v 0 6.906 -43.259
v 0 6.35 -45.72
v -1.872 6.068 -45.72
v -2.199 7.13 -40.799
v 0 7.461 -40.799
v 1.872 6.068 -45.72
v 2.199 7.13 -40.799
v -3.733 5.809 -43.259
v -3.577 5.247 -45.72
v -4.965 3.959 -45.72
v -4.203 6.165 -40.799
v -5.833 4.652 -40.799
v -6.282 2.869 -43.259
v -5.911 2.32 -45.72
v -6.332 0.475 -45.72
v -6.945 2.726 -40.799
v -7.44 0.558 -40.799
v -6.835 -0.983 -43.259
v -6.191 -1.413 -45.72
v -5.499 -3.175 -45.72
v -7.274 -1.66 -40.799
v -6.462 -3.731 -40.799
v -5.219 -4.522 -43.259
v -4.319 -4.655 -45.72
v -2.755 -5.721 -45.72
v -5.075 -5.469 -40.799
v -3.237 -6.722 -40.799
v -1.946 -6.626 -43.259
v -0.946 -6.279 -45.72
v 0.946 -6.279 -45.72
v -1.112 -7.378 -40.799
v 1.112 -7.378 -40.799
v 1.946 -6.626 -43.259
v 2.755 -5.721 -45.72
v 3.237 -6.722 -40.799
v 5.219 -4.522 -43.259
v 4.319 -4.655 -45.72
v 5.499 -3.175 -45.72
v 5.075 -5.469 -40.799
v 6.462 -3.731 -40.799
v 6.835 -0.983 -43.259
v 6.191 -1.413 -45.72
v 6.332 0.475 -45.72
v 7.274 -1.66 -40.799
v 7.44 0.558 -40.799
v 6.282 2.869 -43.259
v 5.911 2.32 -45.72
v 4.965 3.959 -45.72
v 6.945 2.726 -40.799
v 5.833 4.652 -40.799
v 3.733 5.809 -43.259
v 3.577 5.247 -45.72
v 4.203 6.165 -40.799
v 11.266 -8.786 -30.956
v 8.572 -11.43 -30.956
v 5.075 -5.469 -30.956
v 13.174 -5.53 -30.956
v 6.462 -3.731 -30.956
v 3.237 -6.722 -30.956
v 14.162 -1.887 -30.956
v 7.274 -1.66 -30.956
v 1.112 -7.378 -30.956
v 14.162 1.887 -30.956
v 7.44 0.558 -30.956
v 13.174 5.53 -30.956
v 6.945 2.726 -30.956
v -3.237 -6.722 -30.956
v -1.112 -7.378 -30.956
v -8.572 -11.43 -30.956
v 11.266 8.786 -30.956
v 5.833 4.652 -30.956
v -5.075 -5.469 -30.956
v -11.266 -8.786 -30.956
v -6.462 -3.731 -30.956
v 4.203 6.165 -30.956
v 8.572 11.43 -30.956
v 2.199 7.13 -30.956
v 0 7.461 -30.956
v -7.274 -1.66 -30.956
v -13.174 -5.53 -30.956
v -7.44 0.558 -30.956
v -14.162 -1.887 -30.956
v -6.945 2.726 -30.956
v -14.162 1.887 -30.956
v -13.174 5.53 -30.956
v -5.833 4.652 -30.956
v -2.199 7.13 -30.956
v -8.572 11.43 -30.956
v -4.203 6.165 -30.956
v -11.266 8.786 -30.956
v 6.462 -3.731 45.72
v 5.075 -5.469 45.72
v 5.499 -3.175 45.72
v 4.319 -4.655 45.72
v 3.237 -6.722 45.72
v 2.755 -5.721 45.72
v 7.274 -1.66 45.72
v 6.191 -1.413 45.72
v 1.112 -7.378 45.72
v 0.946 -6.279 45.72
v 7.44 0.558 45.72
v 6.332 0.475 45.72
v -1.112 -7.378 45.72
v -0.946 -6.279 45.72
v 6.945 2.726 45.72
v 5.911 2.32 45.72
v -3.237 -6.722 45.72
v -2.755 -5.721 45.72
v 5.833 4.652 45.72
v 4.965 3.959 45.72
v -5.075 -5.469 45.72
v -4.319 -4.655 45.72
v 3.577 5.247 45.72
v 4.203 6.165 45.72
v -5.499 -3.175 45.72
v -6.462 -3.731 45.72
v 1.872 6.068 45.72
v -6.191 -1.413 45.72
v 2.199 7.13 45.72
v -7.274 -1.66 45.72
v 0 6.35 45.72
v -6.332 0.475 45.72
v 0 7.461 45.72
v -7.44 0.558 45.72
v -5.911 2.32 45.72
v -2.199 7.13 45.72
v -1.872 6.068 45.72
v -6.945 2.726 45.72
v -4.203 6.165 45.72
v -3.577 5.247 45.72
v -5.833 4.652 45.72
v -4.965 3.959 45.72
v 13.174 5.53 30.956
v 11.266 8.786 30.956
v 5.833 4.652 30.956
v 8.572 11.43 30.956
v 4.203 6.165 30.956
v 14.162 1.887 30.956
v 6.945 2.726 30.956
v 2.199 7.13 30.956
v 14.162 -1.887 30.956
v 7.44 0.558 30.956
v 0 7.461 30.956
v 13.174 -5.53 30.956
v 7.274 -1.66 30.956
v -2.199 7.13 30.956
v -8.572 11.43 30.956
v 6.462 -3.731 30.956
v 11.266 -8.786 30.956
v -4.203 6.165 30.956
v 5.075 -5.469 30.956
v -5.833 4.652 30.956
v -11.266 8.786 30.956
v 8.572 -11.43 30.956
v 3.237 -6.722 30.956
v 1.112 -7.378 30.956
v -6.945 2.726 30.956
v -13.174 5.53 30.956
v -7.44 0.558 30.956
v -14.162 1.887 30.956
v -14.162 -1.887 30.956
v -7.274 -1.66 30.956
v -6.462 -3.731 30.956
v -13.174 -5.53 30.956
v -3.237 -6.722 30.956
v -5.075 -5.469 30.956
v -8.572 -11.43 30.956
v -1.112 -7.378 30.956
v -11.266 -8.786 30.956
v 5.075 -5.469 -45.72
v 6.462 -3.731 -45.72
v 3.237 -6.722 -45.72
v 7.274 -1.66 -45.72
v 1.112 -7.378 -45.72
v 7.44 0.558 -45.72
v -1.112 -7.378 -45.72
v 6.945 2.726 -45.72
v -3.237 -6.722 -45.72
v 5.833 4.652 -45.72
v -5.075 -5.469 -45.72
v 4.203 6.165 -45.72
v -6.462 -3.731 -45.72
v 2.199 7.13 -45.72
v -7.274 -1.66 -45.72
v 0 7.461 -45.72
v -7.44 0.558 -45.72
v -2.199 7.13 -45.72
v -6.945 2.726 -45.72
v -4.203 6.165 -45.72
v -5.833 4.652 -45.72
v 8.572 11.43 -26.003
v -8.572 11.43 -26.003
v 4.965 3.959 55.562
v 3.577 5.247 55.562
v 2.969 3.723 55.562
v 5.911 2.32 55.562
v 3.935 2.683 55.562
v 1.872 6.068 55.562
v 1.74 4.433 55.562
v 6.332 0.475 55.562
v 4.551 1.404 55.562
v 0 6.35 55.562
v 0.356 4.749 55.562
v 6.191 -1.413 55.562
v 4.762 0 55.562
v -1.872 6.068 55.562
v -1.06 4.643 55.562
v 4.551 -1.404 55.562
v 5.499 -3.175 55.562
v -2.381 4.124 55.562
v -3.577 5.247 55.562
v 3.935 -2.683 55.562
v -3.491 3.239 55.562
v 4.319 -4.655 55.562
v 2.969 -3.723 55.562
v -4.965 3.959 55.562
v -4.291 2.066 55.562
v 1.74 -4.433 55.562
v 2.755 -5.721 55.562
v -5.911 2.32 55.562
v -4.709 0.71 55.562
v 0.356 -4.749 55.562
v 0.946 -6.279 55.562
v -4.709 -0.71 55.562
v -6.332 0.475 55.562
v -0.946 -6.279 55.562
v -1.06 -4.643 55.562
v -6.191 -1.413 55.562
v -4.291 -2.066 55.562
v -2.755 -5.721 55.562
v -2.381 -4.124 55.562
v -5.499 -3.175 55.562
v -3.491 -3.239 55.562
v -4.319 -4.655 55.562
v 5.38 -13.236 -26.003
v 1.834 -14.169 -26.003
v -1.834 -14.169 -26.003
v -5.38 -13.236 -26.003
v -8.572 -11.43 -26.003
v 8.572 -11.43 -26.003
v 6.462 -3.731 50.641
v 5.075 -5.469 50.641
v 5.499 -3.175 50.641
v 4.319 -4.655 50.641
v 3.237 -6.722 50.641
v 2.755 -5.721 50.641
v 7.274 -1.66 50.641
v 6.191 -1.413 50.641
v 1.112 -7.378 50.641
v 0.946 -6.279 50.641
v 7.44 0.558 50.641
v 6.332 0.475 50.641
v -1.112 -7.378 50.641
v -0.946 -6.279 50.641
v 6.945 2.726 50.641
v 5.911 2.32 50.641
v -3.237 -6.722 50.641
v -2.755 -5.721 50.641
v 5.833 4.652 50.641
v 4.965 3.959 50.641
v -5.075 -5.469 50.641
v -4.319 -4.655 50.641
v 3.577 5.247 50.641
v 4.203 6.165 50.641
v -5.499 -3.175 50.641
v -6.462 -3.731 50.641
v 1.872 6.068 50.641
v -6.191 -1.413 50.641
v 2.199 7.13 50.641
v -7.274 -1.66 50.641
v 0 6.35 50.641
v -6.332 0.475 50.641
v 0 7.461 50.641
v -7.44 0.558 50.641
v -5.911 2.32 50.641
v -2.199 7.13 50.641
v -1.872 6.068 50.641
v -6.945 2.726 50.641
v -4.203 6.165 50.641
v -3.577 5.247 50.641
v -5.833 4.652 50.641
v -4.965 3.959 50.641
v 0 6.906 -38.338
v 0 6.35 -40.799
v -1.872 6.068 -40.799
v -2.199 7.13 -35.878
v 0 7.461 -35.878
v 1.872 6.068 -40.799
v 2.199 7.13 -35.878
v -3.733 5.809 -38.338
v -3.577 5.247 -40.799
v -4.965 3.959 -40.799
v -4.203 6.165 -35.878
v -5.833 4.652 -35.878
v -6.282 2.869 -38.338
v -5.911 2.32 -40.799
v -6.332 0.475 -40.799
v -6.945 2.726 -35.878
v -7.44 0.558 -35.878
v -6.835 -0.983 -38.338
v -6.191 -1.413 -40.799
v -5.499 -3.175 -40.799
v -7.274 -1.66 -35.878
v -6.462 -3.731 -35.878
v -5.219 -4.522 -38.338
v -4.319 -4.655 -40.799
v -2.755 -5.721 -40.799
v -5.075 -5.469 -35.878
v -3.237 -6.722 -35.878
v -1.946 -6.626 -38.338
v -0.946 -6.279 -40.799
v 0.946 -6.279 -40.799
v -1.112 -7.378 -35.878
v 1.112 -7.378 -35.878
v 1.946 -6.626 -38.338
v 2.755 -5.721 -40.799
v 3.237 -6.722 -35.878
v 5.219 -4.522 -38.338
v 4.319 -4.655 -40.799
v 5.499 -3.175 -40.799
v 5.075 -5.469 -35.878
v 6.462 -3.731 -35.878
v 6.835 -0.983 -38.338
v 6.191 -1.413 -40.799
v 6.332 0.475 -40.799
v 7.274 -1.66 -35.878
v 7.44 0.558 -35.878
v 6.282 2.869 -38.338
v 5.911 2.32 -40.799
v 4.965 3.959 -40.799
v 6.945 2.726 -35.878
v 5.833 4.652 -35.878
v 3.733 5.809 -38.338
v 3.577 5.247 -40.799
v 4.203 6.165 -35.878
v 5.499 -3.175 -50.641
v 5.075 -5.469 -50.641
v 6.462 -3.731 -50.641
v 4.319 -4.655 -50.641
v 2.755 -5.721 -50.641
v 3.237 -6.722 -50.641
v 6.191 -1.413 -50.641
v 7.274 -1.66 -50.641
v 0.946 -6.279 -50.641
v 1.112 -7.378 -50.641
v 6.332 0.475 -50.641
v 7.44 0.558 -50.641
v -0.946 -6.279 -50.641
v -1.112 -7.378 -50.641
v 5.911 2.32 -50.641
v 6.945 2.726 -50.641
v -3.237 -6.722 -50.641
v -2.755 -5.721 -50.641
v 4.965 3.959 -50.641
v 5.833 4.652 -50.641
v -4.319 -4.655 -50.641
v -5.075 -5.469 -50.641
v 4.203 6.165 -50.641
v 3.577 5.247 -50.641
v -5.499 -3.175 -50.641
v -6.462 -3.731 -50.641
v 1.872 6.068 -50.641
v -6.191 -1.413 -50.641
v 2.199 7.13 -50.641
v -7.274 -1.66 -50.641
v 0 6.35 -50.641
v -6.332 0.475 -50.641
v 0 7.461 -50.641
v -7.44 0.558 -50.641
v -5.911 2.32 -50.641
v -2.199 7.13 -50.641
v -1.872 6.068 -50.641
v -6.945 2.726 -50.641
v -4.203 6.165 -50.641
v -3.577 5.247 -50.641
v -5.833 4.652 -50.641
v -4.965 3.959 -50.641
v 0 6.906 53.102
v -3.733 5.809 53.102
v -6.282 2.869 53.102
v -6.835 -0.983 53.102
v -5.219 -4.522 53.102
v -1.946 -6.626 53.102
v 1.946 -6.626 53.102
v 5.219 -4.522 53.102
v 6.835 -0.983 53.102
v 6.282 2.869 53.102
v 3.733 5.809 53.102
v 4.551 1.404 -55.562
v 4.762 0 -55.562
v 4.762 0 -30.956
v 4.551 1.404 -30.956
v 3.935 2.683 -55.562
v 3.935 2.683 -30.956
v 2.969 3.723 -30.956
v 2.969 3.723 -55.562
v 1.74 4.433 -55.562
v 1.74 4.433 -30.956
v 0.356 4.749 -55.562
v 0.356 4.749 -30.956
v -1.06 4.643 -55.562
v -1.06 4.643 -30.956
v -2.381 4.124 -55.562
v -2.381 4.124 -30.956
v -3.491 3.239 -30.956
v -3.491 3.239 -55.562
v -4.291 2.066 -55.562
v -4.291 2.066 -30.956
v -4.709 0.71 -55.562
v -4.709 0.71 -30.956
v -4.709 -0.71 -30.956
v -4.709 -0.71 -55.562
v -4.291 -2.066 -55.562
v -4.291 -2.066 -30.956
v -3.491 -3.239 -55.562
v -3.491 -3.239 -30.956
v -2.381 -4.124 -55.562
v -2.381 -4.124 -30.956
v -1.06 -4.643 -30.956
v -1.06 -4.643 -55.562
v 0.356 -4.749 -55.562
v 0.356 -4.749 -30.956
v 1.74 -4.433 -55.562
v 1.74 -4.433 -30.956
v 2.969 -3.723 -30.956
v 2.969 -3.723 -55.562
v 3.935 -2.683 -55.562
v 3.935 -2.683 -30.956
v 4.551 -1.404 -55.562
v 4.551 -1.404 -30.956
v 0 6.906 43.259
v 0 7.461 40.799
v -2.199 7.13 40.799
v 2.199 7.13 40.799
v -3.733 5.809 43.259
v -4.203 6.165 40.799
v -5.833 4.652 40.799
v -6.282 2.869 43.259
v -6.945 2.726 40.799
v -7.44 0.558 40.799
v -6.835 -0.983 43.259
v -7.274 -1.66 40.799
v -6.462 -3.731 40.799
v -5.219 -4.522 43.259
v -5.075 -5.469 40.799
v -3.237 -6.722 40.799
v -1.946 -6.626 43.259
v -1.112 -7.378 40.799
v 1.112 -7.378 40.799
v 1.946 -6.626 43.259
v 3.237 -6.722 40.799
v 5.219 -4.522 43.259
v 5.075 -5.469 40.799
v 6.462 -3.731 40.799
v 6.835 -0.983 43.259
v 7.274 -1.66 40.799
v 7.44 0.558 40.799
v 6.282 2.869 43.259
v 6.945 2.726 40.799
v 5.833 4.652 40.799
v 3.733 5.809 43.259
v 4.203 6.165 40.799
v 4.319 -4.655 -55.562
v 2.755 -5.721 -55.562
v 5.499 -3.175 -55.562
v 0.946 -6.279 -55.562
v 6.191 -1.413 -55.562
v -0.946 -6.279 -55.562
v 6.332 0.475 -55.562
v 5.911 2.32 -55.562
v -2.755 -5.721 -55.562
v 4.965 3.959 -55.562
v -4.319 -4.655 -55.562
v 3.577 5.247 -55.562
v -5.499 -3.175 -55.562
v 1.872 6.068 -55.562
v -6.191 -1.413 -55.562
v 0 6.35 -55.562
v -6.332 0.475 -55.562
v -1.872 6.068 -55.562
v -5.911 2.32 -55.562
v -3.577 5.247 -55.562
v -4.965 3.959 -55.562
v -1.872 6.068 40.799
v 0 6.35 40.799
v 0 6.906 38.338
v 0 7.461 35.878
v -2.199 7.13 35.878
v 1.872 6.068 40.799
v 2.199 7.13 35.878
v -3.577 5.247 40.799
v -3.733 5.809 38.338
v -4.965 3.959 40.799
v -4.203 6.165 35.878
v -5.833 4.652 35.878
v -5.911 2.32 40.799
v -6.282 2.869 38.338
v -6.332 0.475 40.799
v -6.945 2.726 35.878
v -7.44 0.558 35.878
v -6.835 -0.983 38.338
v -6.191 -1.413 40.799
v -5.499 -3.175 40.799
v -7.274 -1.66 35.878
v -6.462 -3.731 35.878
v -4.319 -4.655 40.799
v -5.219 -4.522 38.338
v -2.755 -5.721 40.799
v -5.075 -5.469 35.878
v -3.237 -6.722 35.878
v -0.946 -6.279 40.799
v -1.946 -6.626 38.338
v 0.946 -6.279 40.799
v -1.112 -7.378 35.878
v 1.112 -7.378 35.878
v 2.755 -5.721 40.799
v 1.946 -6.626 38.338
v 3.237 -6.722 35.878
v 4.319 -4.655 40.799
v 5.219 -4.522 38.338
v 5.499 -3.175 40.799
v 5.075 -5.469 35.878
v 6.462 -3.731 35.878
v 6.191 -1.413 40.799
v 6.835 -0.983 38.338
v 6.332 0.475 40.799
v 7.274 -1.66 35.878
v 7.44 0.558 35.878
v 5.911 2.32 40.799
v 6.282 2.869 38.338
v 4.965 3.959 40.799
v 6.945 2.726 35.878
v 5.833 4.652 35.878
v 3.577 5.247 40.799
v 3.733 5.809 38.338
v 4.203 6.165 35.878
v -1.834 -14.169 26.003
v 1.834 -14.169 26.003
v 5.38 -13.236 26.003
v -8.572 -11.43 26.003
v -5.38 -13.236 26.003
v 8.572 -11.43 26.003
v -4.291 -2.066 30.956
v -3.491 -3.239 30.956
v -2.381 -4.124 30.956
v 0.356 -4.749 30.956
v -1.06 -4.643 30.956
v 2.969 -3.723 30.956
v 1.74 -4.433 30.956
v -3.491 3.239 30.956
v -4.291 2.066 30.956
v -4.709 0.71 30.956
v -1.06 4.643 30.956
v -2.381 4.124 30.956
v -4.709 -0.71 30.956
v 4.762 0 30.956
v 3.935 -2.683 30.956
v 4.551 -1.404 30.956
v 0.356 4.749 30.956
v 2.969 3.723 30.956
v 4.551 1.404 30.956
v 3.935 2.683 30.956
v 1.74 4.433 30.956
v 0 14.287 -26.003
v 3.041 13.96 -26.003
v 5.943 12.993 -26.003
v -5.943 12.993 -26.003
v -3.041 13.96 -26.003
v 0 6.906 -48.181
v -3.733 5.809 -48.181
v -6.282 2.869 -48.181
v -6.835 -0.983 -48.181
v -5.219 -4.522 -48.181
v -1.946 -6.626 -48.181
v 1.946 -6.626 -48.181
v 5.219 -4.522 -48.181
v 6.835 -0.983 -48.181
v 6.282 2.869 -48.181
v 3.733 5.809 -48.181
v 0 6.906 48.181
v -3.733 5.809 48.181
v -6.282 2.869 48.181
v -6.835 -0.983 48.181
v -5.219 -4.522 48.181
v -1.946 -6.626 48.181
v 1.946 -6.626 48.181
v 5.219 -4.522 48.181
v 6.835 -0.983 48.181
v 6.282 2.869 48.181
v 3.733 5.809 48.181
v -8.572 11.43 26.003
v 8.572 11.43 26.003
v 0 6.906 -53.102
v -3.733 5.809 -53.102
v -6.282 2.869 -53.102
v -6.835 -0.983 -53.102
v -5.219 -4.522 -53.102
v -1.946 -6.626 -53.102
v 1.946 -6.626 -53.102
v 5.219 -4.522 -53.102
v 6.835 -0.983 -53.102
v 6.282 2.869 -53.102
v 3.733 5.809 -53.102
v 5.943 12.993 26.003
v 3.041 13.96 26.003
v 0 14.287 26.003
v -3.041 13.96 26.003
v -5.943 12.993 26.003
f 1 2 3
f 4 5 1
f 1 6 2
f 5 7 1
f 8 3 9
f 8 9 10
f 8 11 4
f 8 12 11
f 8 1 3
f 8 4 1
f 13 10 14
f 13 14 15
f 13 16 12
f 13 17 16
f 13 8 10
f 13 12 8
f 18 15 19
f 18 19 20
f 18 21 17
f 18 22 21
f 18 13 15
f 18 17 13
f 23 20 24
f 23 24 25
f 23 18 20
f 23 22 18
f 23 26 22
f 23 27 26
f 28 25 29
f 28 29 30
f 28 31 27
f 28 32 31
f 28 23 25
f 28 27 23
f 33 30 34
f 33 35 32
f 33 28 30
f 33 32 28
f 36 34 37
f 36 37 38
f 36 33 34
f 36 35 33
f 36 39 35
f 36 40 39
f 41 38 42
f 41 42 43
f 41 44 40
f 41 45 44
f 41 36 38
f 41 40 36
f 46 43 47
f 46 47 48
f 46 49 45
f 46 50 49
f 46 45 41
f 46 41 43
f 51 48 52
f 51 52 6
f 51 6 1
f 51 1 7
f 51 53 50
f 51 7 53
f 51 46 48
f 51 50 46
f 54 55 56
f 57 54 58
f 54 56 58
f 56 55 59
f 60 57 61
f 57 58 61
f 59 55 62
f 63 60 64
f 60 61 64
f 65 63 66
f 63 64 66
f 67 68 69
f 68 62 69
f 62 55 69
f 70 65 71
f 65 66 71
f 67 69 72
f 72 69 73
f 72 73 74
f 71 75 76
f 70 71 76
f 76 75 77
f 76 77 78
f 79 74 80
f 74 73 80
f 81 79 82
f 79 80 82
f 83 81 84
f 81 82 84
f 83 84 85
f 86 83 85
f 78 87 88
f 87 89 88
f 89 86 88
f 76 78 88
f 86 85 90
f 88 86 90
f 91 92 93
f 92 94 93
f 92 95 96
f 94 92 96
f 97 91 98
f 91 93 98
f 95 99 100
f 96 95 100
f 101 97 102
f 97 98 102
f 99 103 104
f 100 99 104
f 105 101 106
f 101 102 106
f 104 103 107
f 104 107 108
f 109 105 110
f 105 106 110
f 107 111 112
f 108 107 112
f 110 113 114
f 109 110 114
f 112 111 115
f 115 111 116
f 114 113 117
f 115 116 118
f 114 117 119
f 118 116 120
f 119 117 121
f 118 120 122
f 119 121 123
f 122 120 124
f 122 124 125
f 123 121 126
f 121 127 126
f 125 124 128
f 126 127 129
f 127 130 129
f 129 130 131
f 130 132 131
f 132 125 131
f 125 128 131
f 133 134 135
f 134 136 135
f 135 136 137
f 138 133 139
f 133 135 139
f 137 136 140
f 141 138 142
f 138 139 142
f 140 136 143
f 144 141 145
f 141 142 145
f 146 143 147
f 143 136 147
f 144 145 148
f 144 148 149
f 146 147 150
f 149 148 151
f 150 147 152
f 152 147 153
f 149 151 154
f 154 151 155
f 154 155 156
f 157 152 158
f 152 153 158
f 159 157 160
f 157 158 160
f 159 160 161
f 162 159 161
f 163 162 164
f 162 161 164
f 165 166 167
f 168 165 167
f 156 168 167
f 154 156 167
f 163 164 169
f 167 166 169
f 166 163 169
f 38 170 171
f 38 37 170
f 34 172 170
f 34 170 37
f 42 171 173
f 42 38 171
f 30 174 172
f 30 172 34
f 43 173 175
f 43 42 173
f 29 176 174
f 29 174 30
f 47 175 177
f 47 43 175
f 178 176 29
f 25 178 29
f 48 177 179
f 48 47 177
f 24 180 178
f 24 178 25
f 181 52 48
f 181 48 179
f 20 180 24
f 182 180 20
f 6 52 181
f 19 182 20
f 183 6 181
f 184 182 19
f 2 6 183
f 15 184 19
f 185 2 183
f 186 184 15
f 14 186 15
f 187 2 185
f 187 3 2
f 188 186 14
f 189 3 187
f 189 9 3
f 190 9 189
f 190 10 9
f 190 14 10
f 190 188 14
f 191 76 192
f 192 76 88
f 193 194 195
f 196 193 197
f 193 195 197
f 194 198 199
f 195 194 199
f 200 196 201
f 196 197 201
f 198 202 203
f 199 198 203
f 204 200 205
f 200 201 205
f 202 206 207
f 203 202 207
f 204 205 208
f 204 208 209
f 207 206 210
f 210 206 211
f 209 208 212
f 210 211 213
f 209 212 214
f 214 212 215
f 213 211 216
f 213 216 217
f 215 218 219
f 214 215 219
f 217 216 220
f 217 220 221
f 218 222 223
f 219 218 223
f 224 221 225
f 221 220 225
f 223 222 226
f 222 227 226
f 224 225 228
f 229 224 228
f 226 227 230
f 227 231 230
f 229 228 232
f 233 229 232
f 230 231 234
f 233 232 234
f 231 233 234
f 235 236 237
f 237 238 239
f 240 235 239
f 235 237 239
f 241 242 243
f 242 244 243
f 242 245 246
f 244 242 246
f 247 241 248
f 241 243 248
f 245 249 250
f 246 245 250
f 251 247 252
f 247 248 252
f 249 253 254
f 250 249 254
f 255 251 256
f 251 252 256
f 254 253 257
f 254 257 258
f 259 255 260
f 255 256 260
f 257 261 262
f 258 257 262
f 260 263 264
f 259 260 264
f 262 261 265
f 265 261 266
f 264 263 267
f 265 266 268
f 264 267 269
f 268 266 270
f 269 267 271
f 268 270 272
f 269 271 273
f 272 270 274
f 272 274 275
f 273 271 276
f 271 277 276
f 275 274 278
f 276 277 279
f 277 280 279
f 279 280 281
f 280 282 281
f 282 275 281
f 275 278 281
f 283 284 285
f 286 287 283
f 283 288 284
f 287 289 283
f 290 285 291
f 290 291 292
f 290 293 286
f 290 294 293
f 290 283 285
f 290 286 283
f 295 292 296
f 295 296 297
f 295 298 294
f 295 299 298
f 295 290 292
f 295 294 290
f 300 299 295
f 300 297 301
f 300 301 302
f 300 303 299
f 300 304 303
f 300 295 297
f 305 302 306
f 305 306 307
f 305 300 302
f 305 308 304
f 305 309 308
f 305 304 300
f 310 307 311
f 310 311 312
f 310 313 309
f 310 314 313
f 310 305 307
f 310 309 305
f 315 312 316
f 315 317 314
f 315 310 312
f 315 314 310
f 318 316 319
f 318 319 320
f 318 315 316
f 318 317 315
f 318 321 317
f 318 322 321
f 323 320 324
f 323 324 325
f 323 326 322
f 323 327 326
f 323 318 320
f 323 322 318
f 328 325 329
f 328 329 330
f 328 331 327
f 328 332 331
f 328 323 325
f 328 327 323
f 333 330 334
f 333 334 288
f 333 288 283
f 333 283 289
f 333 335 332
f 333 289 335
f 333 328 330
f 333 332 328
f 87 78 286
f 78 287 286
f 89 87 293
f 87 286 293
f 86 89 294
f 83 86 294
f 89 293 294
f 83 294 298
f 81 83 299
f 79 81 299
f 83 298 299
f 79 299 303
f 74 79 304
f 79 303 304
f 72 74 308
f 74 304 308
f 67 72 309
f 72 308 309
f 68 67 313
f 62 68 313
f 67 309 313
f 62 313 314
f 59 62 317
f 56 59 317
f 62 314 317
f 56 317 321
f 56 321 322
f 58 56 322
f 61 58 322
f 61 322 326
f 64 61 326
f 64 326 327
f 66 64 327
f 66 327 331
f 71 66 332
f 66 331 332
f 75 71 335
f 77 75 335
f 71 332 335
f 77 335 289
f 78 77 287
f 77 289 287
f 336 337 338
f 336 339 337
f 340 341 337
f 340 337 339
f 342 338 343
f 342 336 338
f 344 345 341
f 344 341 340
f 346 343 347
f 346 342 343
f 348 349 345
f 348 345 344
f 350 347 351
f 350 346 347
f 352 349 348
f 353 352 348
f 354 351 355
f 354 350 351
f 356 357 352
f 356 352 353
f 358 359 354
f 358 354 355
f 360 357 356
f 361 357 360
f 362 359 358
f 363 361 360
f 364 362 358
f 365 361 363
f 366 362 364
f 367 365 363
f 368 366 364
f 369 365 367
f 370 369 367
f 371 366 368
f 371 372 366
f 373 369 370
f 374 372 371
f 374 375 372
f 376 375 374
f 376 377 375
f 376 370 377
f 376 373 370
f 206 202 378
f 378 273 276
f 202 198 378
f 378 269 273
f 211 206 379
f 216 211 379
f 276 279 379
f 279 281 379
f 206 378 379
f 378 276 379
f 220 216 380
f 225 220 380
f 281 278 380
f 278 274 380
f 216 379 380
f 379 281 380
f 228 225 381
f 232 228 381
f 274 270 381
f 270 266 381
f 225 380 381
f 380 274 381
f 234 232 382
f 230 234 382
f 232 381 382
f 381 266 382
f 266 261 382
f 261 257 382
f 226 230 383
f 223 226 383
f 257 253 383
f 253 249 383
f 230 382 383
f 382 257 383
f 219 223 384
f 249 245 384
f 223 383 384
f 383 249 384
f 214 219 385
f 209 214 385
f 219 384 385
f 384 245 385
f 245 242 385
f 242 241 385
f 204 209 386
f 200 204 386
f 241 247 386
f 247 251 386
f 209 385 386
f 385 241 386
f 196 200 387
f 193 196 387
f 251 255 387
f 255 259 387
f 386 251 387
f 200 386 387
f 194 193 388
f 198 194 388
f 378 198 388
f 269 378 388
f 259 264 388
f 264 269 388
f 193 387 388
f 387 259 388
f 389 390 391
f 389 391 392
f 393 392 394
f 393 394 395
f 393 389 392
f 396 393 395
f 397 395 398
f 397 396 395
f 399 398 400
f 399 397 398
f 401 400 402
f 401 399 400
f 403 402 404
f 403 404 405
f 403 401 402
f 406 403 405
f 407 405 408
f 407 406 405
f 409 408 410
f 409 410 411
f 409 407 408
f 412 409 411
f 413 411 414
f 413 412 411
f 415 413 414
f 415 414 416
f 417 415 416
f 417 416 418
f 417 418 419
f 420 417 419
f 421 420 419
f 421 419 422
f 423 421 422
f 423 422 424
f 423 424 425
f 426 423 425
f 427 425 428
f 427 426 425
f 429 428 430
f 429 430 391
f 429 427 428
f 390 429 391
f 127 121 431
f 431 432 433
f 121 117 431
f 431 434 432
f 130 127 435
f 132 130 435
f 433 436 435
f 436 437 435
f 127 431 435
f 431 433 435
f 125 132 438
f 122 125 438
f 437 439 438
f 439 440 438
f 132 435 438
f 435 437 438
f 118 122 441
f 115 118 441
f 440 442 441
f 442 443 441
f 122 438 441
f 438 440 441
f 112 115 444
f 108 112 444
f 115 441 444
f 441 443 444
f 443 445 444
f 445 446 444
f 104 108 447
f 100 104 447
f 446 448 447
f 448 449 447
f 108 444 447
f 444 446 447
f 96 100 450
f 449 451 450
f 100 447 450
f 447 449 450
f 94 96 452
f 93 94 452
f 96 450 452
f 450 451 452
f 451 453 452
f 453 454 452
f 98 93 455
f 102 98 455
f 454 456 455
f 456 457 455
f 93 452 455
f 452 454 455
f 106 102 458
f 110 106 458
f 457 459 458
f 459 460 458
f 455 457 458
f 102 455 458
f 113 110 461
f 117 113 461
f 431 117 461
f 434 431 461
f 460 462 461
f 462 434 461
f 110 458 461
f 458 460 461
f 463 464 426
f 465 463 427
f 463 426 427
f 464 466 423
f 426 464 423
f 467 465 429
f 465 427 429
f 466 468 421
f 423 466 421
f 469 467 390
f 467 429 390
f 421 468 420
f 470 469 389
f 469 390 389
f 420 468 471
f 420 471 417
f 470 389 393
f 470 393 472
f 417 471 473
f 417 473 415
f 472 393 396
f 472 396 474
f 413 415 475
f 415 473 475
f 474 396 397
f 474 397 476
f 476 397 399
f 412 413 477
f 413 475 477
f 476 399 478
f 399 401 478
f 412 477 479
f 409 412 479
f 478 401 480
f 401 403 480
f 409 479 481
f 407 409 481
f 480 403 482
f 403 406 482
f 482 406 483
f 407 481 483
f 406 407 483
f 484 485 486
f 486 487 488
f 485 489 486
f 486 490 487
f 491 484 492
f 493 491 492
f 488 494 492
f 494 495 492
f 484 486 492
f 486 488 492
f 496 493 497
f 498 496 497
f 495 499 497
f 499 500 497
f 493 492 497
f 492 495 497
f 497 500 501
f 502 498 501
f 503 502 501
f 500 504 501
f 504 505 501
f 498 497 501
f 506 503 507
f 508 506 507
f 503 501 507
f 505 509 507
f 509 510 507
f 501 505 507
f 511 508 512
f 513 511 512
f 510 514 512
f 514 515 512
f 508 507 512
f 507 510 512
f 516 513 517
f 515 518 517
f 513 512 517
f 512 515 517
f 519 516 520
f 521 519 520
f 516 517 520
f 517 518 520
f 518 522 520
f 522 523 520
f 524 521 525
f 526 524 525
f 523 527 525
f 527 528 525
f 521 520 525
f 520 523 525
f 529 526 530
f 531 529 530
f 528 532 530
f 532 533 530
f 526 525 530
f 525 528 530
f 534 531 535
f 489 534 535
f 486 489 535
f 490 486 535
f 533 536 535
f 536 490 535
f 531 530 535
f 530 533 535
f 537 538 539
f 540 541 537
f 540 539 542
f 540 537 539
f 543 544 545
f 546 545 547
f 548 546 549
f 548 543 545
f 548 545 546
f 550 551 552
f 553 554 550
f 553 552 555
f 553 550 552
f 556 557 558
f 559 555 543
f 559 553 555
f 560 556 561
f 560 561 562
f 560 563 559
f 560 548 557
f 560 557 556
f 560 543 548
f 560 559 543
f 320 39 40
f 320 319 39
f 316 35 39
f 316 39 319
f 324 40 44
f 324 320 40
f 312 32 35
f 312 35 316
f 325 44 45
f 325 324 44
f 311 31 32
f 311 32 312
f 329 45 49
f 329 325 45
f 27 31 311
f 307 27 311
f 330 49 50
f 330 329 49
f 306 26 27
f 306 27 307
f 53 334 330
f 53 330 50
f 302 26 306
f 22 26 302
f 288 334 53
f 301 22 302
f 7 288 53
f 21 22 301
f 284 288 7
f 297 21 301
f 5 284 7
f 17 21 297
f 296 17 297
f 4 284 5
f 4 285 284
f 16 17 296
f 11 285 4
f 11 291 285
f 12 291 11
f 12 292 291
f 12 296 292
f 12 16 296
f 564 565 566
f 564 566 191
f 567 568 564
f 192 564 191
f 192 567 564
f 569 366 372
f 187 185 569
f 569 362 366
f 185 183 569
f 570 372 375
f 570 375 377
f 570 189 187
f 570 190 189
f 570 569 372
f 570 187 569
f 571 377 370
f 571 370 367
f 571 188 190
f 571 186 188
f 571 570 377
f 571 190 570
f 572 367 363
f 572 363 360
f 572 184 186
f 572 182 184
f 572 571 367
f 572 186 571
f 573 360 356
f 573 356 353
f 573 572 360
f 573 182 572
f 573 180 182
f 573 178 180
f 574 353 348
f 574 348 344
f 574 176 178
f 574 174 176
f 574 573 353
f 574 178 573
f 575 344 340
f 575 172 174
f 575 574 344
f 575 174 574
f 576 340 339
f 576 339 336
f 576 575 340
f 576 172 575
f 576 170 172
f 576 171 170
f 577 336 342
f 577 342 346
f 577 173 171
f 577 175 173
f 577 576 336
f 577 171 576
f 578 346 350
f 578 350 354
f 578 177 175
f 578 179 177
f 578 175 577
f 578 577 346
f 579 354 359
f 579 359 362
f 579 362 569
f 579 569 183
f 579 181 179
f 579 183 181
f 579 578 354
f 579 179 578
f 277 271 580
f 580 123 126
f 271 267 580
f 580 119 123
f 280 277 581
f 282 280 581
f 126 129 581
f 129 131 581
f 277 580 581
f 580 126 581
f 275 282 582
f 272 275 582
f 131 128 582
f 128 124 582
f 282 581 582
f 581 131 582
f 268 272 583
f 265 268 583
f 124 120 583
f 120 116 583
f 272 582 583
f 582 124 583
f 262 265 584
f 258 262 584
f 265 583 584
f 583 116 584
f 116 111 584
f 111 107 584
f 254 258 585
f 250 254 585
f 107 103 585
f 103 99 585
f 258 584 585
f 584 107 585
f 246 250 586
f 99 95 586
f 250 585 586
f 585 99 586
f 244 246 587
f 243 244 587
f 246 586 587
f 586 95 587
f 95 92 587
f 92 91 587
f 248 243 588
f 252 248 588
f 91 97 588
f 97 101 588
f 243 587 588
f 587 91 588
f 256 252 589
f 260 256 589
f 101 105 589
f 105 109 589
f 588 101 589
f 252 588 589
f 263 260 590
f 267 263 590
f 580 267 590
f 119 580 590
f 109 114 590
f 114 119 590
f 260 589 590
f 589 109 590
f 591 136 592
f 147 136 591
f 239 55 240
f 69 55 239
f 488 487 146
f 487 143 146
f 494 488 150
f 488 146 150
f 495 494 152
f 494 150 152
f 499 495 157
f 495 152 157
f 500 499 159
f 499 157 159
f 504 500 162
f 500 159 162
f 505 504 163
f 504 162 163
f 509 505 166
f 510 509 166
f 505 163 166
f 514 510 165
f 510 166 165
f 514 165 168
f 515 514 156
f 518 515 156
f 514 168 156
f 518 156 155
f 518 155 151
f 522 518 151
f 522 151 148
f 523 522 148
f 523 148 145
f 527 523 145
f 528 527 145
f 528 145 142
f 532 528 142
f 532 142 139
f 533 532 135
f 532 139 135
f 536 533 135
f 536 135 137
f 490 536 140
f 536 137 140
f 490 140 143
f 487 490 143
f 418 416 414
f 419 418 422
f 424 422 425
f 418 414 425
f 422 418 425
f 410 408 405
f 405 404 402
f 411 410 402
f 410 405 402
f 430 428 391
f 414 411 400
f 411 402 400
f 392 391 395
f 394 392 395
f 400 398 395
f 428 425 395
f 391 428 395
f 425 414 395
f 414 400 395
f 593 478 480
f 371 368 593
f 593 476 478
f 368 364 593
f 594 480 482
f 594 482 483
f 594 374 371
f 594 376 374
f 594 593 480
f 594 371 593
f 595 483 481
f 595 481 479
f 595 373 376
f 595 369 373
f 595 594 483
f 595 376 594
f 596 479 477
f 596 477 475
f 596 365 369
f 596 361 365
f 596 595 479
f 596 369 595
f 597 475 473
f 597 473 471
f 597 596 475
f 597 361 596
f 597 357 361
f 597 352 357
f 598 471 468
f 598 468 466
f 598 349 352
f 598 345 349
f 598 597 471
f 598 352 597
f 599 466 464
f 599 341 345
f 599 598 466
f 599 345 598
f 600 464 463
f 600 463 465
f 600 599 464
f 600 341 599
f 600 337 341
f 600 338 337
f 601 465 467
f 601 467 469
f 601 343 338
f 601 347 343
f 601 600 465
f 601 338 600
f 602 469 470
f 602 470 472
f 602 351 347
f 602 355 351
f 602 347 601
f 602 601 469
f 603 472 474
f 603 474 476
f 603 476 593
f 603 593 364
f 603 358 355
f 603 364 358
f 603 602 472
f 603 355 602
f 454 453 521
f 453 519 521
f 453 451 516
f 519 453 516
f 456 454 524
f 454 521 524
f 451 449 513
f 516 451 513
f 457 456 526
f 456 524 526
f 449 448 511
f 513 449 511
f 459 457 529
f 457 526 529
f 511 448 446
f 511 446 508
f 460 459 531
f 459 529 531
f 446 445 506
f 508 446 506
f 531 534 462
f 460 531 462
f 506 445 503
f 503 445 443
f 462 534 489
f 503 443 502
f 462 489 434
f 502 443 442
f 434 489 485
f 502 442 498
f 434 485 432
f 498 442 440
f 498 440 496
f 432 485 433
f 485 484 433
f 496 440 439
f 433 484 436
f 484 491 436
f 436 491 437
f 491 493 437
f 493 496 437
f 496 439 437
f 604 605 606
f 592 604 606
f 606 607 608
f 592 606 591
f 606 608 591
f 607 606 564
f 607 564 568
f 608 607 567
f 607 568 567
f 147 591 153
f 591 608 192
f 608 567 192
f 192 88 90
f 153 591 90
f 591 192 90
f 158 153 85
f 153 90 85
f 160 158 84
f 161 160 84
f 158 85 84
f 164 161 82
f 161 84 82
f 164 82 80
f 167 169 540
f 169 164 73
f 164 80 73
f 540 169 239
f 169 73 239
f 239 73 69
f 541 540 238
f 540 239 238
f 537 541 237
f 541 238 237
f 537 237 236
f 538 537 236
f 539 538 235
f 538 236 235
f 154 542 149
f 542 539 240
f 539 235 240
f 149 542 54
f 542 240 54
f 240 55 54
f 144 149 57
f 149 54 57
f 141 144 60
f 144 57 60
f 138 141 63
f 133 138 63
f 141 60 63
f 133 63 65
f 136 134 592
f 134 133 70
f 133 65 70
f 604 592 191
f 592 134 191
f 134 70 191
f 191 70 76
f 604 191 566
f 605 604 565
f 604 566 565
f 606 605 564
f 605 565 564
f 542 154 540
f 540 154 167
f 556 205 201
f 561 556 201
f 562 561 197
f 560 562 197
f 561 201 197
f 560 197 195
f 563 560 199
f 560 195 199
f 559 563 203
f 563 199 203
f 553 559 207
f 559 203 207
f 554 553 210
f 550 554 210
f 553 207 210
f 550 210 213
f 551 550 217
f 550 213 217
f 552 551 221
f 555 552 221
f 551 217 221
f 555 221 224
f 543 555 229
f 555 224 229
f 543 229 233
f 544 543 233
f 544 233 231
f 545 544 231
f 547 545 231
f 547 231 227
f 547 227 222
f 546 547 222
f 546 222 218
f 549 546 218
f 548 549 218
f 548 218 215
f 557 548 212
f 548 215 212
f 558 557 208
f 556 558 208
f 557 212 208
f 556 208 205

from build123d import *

# Parameters (mm, degrees)
CUT_EXTRUDE1_DEPTH   = 4.953
MIRROR2_COPY_1_DEPTH = 4.953
LPATTERN1_COUNT      = 4
LPATTERN1_PITCH      = 4.92125
SKETCH5_R            = 4.7625
CUT_EXTRUDE2_DEPTH   = 24.60625


with BuildPart() as part:
    # Sketch2 → Revolve1 (revolve)
    with BuildSketch(Plane(origin=(0, 0, 0), x_dir=(0, 0, -1), z_dir=(1, 0, 0))):
        Polygon((-55.5625, 0), (-55.5625, 7.46125), (-30.95625, 7.46125), (-30.95625, 14.2875), (30.95625, 14.2875), (30.95625, 7.46125), (55.5625, 7.46125), (55.5625, 0), align=None)
    revolve(axis=Axis((0, 0, -30.95625), (0, 0, 1)))

    # Sketch3 → Cut-Extrude1 (cut)
    with BuildSketch(Plane(origin=(0, 0, -30.95625), x_dir=(-1, 0, 0), z_dir=(0, 0, -1))):
        with BuildLine():
            Line((-8.5725, 11.43), (8.5725, 11.43))
            ThreePointArc((8.5725, 11.43), (0, 14.2875), (-8.5725, 11.43))
        make_face()
    cut_extrude1 = extrude(amount=-CUT_EXTRUDE1_DEPTH, mode=Mode.SUBTRACT)

    # Mirror1: Cut-Extrude1 across plane
    add(cut_extrude1.mirror(Plane.ZX), mode=Mode.SUBTRACT)

    # Mirror2: Cut-Extrude1 across plane
    add(cut_extrude1.mirror(Plane.XY), mode=Mode.SUBTRACT)

    # Mirror2 copy 1 sketch → Mirror2 copy 1 (cut)
    with BuildSketch(Plane(origin=(0, 0, 30.95625), x_dir=(-1, 0, 0), z_dir=(0, 0, 1))):
        with BuildLine():
            Line((-8.5725, 11.43), (8.5725, 11.43))
            ThreePointArc((8.5725, 11.43), (0, 14.2875), (-8.5725, 11.43))
        make_face()
    extrude(amount=-MIRROR2_COPY_1_DEPTH, mode=Mode.SUBTRACT)

    # Sketch4 → Cut-Revolve1 (revolve, cut)
    with BuildSketch(Plane(origin=(0, 0, 0), x_dir=(0, 0, -1), z_dir=(1, 0, 0))):
        Polygon((-55.5625, 7.46125), (-55.5625, 6.35), (-50.64125, 7.46125), align=None)
    cut_revolve1 = revolve(axis=Axis((0, 0, -55.5625), (0, 0, 1)), mode=Mode.SUBTRACT)

    # LPattern1: Cut-Revolve1 ×4
    with Locations(*[(0, 0, -i * LPATTERN1_PITCH) for i in range(1, LPATTERN1_COUNT)]):
        add(cut_revolve1, mode=Mode.SUBTRACT)

    # Mirror3: Cut-Revolve1 across plane
    add(cut_revolve1.mirror(Plane.XY), mode=Mode.SUBTRACT)

    # Mirror3 copy 1 sketch → Mirror3 copy 1 (revolve, cut)
    with BuildSketch(Plane(origin=(0, 0, 4.92125), x_dir=(0, 0, 1), z_dir=(1, 0, 0))):
        Polygon((-55.5625, -7.46125), (-55.5625, -6.35), (-50.64125, -7.46125), align=None)
    revolve(axis=Axis((0, 0, 60.48375), (0, 0, 1)), mode=Mode.SUBTRACT)

    # Mirror3 copy 2 sketch → Mirror3 copy 2 (revolve, cut)
    with BuildSketch(Plane(origin=(0, 0, 9.8425), x_dir=(0, 0, 1), z_dir=(1, 0, 0))):
        Polygon((-55.5625, -7.46125), (-55.5625, -6.35), (-50.64125, -7.46125), align=None)
    revolve(axis=Axis((0, 0, 65.405), (0, 0, 1)), mode=Mode.SUBTRACT)

    # Mirror3 copy 3 sketch → Mirror3 copy 3 (revolve, cut)
    with BuildSketch(Plane(origin=(0, 0, 14.76375), x_dir=(0, 0, 1), z_dir=(1, 0, 0))):
        Polygon((-55.5625, -7.46125), (-55.5625, -6.35), (-50.64125, -7.46125), align=None)
    revolve(axis=Axis((0, 0, 70.32625), (0, 0, 1)), mode=Mode.SUBTRACT)

    # Sketch5 → Cut-Extrude2 (cut)
    with BuildSketch(Plane.XY.offset(55.5625)):
        Circle(SKETCH5_R)
    cut_extrude2 = extrude(amount=-CUT_EXTRUDE2_DEPTH, mode=Mode.SUBTRACT)

    # Mirror4: Cut-Extrude2 across plane
    add(cut_extrude2.mirror(Plane.XY), mode=Mode.SUBTRACT)


solid = part.part
